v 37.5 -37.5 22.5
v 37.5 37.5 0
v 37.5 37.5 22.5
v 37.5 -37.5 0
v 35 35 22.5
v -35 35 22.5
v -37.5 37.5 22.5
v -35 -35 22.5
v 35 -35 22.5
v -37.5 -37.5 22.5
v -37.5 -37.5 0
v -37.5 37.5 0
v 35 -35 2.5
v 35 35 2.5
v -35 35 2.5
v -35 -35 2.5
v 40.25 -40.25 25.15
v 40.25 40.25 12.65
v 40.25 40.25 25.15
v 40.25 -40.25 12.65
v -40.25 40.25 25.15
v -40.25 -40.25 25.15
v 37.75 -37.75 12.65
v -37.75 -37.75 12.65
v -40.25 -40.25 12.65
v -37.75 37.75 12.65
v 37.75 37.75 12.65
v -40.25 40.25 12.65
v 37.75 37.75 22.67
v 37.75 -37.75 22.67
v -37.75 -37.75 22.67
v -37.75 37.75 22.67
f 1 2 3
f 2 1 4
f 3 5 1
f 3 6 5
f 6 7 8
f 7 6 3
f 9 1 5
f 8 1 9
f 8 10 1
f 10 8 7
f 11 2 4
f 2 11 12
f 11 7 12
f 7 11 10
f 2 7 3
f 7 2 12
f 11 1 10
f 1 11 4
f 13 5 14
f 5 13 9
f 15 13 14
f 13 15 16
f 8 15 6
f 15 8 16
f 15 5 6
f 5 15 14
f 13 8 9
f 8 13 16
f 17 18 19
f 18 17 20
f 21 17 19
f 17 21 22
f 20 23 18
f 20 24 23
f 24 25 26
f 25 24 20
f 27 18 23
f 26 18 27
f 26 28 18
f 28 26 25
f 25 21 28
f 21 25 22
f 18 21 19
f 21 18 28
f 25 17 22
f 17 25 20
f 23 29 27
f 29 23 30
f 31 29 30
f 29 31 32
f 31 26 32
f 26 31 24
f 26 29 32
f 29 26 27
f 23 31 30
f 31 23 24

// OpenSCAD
// Two-part enclosure: open-top base + slip-over lid.
// Units: mm.

$fn = 48;

wall = 2.5;
clearance = 0.25;     // nominal lateral print clearance
assembly_gap = 0.15;  // small visual gap so the solids do not touch
eps = 0.02;

cavity_x = 70;
cavity_y = 70;
cavity_z = 20;

base_bottom = wall;
base_outer_x = cavity_x + 2 * wall;
base_outer_y = cavity_y + 2 * wall;
base_h = cavity_z + base_bottom;

lid_skirt = 10;
lid_top = wall;
lid_inner_x = base_outer_x + 2 * clearance;
lid_inner_y = base_outer_y + 2 * clearance;
lid_outer_x = lid_inner_x + 2 * wall;
lid_outer_y = lid_inner_y + 2 * wall;
lid_h = lid_skirt + lid_top;

module base_part() {
    difference() {
        translate([-base_outer_x / 2, -base_outer_y / 2, 0])
            cube([base_outer_x, base_outer_y, base_h], center = false);

        translate([-cavity_x / 2, -cavity_y / 2, base_bottom])
            cube([cavity_x, cavity_y, cavity_z + eps], center = false);
    }
}

module lid_part() {
    difference() {
        translate([-lid_outer_x / 2, -lid_outer_y / 2, 0])
            cube([lid_outer_x, lid_outer_y, lid_h], center = false);

        translate([-lid_inner_x / 2, -lid_inner_y / 2, 0])
            cube([lid_inner_x, lid_inner_y, lid_skirt + eps], center = false);
    }
}

color([0.18, 0.55, 0.75]) base_part();
translate([0, 0, base_h - lid_skirt + assembly_gap])
    color([0.90, 0.72, 0.22]) lid_part();
